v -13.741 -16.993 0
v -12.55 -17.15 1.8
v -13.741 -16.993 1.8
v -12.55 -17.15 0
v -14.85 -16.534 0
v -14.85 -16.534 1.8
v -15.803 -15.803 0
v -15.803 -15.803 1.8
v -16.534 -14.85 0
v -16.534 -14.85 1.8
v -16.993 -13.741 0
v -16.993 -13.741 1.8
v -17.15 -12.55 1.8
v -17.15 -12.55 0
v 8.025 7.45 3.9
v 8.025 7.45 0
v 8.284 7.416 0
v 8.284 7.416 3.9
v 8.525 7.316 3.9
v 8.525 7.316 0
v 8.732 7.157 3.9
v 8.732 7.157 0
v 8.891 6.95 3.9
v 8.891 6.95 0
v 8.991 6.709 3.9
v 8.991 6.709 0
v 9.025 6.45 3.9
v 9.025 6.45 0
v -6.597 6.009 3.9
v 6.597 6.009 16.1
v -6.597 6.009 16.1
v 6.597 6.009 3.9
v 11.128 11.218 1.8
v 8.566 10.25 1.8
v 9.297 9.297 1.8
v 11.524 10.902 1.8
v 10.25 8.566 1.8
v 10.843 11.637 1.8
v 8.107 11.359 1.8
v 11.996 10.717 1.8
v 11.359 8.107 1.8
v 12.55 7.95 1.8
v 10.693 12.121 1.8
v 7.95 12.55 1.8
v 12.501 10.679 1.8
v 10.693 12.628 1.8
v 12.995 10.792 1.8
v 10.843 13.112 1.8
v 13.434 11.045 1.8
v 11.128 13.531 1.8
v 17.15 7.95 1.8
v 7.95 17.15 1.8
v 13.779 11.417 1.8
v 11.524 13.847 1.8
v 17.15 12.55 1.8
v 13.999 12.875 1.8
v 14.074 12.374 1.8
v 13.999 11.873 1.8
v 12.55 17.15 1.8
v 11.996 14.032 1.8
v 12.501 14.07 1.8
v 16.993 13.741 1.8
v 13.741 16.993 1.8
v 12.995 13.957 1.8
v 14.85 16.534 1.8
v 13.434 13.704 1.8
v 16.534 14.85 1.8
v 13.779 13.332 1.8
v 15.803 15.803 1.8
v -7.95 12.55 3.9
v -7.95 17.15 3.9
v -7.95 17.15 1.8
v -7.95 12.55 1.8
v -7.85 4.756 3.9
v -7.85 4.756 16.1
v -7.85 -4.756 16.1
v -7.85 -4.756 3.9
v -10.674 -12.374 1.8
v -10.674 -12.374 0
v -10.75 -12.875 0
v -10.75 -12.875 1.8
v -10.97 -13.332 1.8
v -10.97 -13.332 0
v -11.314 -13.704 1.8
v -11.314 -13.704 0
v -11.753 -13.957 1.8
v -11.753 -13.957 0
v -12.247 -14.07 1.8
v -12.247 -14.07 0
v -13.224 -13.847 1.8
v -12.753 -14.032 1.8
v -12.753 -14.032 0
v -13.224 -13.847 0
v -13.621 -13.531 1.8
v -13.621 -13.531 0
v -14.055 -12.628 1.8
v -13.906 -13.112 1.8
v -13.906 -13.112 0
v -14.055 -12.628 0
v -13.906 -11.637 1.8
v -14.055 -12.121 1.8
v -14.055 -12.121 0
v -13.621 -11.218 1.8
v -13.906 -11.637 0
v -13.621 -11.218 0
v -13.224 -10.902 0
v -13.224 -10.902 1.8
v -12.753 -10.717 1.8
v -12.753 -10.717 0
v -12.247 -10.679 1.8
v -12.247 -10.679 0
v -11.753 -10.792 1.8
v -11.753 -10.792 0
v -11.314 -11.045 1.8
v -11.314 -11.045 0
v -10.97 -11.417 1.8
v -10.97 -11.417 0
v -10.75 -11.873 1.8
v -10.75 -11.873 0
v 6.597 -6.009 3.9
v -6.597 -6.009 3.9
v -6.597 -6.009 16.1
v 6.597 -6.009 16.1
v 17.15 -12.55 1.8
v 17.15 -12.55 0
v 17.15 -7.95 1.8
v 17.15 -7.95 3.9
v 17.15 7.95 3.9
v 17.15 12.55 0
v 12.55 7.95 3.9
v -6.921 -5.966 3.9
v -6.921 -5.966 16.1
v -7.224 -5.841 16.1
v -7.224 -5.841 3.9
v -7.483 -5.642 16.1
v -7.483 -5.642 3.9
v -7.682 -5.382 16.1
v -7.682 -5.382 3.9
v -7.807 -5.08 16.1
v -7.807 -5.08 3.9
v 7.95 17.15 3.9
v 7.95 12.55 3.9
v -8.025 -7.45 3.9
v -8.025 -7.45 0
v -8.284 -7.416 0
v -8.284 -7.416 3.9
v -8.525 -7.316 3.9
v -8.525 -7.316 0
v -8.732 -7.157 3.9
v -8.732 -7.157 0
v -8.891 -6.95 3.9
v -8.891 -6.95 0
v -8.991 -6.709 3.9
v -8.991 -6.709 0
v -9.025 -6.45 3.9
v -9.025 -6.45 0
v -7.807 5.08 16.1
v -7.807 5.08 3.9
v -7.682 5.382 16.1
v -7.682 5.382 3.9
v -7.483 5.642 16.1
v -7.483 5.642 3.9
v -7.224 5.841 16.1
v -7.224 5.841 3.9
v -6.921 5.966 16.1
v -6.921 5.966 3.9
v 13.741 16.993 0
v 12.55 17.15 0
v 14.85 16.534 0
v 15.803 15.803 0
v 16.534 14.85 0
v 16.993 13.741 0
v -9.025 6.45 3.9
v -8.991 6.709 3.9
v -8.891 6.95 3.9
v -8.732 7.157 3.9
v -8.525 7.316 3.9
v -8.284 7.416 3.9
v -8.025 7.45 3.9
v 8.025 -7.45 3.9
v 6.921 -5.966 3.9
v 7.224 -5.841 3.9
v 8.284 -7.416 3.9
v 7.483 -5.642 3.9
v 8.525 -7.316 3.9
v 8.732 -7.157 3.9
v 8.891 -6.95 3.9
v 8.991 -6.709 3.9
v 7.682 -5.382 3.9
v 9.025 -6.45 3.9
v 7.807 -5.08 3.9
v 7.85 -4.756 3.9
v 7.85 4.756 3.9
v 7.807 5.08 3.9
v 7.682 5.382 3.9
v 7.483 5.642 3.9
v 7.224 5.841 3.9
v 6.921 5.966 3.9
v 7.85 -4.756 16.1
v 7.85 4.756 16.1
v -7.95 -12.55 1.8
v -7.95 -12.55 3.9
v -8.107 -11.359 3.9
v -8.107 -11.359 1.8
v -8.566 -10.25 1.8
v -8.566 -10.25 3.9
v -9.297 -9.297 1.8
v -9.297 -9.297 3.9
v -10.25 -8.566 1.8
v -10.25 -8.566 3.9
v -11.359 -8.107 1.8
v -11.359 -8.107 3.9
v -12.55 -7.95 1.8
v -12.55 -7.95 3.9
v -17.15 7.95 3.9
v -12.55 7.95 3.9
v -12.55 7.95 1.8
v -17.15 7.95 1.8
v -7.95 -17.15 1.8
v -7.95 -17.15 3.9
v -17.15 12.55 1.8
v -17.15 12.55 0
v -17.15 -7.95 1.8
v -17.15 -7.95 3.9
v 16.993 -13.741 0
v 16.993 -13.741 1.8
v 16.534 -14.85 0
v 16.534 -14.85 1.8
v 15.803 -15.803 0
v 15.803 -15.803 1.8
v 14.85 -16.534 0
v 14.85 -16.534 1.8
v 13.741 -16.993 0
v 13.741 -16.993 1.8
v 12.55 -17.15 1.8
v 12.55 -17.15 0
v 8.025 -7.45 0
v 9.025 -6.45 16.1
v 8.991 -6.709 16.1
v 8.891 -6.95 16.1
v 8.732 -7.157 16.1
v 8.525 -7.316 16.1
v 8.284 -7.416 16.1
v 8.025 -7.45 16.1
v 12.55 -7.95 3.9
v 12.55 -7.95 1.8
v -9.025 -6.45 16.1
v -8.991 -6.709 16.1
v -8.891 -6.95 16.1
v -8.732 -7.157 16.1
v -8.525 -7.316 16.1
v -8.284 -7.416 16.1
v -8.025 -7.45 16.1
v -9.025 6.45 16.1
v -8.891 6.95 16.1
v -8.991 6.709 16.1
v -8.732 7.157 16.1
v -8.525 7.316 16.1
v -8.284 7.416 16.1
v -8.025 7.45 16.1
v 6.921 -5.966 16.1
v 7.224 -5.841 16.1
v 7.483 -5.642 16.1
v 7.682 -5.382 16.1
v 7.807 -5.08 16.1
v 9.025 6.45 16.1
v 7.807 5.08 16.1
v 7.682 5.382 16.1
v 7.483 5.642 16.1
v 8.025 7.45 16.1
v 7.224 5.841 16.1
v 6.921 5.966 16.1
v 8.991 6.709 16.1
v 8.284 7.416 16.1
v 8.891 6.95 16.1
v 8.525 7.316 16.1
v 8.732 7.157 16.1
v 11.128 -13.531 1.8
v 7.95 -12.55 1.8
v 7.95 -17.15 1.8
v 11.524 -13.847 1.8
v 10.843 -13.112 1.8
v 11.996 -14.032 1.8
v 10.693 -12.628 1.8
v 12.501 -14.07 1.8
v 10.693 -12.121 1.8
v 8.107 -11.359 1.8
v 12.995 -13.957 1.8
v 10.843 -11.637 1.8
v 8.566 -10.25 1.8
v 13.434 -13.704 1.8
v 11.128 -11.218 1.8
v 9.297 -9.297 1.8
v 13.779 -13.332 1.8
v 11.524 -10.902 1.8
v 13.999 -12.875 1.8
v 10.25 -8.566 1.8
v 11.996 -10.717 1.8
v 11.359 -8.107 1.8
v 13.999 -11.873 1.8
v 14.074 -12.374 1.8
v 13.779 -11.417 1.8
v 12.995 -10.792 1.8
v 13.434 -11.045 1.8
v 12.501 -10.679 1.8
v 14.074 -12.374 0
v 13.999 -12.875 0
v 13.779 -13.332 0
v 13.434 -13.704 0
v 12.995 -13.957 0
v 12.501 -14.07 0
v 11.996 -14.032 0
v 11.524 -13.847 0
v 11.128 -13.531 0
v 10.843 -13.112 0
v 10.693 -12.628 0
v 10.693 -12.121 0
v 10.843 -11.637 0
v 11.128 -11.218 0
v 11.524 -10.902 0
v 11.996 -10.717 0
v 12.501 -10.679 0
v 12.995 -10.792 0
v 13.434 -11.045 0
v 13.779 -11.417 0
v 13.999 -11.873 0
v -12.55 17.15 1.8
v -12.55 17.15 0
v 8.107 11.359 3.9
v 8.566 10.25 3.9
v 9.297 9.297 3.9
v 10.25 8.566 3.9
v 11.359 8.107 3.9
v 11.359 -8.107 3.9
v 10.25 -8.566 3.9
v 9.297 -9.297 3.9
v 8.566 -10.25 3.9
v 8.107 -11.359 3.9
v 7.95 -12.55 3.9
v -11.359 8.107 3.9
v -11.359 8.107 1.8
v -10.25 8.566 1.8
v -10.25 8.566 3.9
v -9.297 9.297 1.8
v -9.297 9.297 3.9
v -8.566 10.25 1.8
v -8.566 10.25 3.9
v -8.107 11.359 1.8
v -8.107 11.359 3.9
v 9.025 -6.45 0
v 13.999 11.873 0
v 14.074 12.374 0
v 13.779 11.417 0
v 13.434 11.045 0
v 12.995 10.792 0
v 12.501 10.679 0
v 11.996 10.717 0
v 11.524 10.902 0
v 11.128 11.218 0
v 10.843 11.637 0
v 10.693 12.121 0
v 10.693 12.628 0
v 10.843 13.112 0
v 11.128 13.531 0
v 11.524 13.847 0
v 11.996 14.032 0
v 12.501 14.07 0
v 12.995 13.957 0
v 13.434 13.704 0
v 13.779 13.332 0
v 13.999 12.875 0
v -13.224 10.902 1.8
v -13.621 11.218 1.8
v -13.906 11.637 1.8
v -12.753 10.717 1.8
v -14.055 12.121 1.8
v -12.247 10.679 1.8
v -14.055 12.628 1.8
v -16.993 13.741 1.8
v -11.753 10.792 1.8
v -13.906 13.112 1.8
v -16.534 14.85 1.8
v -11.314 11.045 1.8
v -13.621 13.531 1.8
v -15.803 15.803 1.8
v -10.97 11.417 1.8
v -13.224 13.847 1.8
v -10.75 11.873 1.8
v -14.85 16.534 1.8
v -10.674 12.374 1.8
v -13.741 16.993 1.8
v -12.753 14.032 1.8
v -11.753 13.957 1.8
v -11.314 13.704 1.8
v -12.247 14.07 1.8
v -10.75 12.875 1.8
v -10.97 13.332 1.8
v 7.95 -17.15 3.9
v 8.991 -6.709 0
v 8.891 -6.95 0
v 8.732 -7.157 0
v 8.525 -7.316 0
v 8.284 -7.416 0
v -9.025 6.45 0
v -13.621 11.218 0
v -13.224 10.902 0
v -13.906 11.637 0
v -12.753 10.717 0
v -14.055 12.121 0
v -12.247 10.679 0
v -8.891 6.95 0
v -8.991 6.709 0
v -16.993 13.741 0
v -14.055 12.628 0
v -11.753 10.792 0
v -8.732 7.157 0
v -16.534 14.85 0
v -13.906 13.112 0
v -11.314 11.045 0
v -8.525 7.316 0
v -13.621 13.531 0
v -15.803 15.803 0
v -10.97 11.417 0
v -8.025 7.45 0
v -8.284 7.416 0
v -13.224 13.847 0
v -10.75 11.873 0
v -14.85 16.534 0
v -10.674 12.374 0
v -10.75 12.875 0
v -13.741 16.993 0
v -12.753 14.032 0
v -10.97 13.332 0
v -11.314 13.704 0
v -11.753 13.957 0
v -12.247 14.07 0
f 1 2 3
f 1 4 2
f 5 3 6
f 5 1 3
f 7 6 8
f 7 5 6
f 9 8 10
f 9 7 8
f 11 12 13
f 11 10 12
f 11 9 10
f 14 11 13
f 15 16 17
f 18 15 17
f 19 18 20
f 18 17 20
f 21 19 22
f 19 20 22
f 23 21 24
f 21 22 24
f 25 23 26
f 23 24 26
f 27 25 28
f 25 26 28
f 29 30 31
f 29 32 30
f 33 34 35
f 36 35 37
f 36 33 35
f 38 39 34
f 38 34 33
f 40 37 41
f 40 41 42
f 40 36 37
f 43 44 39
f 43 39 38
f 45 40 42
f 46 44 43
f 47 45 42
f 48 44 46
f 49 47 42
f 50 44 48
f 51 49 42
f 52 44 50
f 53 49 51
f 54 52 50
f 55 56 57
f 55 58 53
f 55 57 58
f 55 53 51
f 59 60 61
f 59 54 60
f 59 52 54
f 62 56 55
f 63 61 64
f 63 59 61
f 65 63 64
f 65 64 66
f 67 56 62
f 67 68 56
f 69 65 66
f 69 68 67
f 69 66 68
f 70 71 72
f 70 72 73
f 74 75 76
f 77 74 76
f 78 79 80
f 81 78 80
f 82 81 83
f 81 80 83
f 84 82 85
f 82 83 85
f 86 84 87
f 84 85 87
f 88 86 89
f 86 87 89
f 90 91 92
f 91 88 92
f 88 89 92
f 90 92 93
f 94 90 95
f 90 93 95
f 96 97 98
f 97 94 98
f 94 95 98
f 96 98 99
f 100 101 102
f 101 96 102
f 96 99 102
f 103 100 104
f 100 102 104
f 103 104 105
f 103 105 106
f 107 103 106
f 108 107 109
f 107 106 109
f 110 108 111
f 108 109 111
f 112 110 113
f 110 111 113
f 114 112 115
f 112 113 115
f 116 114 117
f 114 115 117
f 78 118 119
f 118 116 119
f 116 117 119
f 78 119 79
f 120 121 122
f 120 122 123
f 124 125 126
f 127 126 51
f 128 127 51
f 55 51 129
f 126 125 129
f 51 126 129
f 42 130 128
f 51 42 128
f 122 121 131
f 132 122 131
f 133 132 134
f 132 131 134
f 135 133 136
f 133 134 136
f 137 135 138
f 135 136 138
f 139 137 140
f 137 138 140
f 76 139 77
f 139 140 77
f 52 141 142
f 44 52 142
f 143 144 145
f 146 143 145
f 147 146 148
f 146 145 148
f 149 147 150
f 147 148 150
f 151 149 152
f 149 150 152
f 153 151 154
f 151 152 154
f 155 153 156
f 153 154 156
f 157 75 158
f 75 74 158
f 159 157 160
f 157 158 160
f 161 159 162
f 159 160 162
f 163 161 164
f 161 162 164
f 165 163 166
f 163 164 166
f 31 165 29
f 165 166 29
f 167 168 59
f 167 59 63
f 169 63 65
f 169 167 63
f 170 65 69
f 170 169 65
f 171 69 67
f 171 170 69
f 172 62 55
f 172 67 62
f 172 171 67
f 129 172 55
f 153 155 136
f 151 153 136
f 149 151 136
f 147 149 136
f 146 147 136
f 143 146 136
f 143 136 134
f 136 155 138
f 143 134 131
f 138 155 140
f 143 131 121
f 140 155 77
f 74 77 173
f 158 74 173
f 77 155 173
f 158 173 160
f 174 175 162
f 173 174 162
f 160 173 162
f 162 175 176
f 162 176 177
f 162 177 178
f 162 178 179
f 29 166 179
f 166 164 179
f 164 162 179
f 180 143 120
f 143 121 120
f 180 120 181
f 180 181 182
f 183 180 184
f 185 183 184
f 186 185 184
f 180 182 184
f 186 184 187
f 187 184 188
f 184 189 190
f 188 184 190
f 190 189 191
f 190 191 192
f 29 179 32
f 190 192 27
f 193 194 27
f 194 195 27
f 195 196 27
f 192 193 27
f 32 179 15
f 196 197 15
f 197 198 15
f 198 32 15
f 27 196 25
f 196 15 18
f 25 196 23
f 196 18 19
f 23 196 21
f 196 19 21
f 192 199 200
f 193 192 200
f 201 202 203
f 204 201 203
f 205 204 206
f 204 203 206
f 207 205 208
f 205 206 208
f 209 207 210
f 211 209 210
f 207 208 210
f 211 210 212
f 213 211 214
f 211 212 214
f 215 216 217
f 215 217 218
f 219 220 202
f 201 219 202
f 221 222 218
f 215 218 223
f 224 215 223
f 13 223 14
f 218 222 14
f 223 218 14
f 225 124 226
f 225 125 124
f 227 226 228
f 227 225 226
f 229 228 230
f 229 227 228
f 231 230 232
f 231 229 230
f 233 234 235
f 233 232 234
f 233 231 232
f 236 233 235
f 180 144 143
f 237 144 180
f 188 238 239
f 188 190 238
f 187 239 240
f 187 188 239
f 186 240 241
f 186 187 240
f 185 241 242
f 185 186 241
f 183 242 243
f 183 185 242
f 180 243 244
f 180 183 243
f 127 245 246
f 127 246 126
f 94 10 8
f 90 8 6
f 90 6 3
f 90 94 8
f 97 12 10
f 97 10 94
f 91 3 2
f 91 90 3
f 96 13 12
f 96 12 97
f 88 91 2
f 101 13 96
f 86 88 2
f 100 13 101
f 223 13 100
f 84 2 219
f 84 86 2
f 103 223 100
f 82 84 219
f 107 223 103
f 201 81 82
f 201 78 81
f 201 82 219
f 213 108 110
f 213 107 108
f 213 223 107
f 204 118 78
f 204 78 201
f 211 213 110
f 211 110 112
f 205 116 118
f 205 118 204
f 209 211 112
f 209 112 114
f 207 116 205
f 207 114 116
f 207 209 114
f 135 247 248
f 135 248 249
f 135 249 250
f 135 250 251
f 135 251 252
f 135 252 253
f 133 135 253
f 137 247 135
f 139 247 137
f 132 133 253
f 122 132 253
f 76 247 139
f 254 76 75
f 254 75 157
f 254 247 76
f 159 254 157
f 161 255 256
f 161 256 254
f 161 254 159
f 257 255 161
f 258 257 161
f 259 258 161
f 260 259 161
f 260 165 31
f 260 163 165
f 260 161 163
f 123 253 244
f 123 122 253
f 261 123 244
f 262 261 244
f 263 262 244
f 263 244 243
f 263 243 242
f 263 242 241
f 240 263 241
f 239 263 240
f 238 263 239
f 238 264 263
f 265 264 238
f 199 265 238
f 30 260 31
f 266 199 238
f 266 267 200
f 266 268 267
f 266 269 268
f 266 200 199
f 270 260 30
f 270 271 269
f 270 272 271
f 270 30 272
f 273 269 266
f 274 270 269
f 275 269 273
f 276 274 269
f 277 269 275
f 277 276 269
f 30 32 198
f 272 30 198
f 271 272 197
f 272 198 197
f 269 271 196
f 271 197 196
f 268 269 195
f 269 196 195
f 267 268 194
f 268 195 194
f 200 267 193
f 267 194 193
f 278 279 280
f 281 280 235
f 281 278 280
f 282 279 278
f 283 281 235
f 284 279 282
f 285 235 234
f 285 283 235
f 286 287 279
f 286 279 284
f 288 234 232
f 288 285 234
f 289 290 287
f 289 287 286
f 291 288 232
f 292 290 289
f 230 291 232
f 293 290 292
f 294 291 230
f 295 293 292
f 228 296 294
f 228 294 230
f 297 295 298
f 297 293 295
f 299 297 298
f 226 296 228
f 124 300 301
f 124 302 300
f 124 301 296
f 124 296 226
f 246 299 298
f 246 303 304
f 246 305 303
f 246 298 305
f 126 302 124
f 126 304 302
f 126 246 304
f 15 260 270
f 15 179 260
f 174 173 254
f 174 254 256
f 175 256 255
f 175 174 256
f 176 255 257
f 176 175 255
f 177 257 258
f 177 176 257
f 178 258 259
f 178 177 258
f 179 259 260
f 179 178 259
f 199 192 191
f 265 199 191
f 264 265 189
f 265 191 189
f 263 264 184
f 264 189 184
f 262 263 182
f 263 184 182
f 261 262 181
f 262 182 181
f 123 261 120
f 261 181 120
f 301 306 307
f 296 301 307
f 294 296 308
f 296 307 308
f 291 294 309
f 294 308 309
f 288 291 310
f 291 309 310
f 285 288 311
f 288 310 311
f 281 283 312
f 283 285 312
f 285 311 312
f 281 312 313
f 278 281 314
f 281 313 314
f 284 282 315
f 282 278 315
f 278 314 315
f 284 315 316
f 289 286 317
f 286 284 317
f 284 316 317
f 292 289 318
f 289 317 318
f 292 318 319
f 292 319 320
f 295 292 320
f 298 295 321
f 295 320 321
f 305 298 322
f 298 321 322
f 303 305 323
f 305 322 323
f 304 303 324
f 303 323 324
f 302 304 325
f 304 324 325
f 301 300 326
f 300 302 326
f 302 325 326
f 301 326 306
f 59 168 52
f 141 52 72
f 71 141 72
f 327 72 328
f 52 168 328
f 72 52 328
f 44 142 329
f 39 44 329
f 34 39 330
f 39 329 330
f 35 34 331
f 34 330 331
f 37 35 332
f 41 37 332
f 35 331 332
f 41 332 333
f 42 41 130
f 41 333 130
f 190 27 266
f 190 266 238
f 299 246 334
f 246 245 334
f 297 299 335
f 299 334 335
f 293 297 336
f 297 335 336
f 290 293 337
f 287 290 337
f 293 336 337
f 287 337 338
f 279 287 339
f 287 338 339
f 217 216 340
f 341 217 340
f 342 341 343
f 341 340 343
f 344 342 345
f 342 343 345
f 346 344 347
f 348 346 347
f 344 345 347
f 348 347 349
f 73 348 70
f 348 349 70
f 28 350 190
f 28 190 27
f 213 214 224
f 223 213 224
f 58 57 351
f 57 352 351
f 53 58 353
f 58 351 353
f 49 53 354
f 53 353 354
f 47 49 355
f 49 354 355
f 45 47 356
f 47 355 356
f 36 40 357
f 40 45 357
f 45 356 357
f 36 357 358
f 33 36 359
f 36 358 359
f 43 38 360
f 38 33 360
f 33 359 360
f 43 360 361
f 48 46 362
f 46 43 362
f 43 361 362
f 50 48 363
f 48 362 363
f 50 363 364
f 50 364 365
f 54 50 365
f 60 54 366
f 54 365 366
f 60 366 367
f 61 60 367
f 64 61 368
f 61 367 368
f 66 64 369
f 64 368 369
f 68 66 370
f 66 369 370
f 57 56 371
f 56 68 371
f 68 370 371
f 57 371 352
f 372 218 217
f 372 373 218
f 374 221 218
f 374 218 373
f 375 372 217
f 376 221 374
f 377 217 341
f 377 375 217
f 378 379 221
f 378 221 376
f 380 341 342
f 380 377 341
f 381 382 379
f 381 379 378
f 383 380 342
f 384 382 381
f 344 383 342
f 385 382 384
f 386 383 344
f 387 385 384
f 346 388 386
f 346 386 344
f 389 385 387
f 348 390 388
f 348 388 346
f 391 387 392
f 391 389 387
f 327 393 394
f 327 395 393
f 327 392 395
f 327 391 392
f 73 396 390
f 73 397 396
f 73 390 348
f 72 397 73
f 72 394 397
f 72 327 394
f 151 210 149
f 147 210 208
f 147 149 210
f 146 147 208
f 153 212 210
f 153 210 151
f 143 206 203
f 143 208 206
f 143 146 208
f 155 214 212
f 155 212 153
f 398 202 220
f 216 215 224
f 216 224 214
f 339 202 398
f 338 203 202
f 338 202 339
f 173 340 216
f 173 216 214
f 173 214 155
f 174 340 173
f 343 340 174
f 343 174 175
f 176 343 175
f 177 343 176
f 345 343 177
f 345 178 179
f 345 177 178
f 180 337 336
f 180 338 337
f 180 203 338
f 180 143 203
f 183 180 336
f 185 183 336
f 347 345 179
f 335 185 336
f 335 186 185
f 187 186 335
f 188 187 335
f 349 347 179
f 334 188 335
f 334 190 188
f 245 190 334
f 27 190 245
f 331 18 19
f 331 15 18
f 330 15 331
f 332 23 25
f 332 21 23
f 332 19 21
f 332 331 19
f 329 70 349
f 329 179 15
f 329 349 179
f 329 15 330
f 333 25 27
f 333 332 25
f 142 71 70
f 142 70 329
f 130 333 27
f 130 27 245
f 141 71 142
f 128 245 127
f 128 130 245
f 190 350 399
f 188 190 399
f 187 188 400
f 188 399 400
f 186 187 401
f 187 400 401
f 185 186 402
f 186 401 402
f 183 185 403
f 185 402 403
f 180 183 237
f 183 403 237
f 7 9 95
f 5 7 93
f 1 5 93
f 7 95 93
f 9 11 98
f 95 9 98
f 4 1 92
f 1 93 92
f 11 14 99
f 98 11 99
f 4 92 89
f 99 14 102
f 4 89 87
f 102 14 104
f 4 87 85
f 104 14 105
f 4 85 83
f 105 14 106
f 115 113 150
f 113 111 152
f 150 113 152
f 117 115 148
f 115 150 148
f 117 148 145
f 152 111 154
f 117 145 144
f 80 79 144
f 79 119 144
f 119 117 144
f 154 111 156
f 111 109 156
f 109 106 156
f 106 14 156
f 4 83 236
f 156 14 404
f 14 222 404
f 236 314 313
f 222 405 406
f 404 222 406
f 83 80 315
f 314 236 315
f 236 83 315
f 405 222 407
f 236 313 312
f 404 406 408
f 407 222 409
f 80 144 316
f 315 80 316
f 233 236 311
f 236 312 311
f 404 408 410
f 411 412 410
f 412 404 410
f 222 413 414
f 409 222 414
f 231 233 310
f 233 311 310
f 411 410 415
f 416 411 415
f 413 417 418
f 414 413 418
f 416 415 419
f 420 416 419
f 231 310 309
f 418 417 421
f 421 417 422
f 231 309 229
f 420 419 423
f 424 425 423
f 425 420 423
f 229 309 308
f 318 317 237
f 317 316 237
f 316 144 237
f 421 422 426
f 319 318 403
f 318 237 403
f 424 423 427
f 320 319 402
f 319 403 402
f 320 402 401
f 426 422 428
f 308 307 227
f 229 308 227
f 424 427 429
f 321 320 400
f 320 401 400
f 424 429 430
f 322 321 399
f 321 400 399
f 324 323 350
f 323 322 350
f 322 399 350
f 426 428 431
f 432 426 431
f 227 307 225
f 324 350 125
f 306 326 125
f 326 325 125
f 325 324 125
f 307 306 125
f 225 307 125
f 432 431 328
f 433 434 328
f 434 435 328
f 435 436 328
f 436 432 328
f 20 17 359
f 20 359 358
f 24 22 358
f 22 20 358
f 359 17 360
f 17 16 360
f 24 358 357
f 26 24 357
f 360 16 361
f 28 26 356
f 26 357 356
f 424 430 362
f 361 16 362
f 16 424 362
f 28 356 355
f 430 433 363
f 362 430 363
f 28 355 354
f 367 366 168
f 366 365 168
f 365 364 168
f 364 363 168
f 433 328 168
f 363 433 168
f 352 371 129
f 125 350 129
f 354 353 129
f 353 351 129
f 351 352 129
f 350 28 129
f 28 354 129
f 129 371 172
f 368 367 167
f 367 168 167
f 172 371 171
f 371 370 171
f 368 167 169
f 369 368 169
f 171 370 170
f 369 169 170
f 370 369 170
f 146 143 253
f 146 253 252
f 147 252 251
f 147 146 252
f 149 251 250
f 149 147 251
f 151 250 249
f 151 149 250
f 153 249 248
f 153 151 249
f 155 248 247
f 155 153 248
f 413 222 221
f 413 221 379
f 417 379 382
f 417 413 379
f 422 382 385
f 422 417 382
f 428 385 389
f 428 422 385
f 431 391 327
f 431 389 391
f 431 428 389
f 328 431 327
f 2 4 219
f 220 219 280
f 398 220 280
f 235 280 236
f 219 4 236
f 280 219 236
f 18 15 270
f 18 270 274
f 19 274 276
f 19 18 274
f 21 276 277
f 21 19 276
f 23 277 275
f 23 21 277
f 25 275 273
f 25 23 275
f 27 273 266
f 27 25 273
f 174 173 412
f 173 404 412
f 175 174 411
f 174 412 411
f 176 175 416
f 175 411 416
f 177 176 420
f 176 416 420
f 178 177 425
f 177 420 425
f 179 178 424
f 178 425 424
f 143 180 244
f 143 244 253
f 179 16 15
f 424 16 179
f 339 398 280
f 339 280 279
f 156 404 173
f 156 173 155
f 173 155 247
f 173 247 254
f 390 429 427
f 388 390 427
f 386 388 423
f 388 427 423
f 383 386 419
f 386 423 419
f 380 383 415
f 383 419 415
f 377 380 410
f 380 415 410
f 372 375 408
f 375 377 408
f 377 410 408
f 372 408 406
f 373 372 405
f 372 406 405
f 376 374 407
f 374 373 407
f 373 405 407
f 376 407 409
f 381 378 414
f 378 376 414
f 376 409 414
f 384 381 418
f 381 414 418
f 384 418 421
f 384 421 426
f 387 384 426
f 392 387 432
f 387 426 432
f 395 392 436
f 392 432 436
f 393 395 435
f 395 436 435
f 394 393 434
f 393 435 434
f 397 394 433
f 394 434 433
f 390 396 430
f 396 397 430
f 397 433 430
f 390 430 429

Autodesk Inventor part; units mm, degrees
ref_plane "YZ Plane" through (0, 0, 0) normal (1, 0, 0) x (0, 1, 0)
ref_plane "XZ Plane" through (0, 0, 0) normal (0, 1, 0) x (-1, 0, 0)
ref_plane "XY Plane" through (0, 0, 0) normal (0, 0, 1) x (1, 0, 0)
sketch "Sketch1" plane through (0, 0, 0) normal (0, 0, 1) x (1, 0, 0)
  line L0 (-12.55, -17.15) -> (12.55, -17.15)
  line L1 (17.15, -12.55) -> (17.15, 12.55)
  line L2 (12.55, 17.15) -> (-12.55, 17.15)
  line L3 (-17.15, 12.55) -> (-17.15, -12.55)
  line L4 (-17.15, -17.15) -> (17.15, 17.15) construction
  line L5 (17.15, -17.15) -> (-17.15, 17.15) construction
  circle A0 centre (0, 0) radius 17.5 construction
  circle A1 centre (-12.3744, 12.3744) radius 1.7
  circle A2 centre (-12.3744, -12.3744) radius 1.7
  circle A3 centre (12.3744, -12.3744) radius 1.7
  circle A4 centre (12.3744, 12.3744) radius 1.7
  line L6 (-12.3744, 12.3744) -> (-12.3744, 17.15) construction
  line L7 (-12.3744, 12.3744) -> (-7.5987, 12.3744) construction
  arc A5 (-12.55, 17.15) -> (-17.15, 12.55) centre (-12.55, 12.55) ccw
  arc A6 (17.15, 12.55) -> (12.55, 17.15) centre (12.55, 12.55) ccw
  arc A7 (12.55, -17.15) -> (17.15, -12.55) centre (12.55, -12.55) ccw
  arc A8 (-17.15, -12.55) -> (-12.55, -17.15) centre (-12.55, -12.55) ccw
  line L8 (-8.025, -7.45) -> (8.025, -7.45)
  line L9 (9.025, -6.45) -> (9.025, 6.45)
  line L10 (8.025, 7.45) -> (-8.025, 7.45)
  line L11 (-9.025, 6.45) -> (-9.025, -6.45)
  line L12 (-9.025, -7.45) -> (9.025, 7.45) construction
  line L13 (9.025, -7.45) -> (-9.025, 7.45) construction
  arc A9 (-8.025, 7.45) -> (-9.025, 6.45) centre (-8.025, 6.45) ccw
  arc A10 (9.025, 6.45) -> (8.025, 7.45) centre (8.025, 6.45) ccw
  arc A11 (8.025, -7.45) -> (9.025, -6.45) centre (8.025, -6.45) ccw
  arc A12 (-9.025, -6.45) -> (-8.025, -7.45) centre (-8.025, -6.45) ccw
  dimension "d0" = 34.3
  dimension "d1" = 34.3
  dimension "d2" = 35
  dimension "d3" = 3.4
  dimension "d4" = 3.4
  dimension "d5" = 3.4
  dimension "d6" = 3.4
  dimension "d7" = 90
  dimension "d8" = 4.6
  dimension "d9" = 18.05
  dimension "d10" = 14.9
  dimension "d11" = 1
extrude "Extrusion1" add sketch "Sketch1" along normal blind 3.9
sketch "Sketch2" plane through (0, 0, 3.9) normal (0, 0, 1) x (1, 0, 0)
  arc A0 (9.025, 6.45) -> (8.025, 7.45) centre (8.025, 6.45) ccw projected
  line L0 (9.025, 6.45) -> (9.025, -6.45) projected
  arc A1 (8.025, -7.45) -> (9.025, -6.45) centre (8.025, -6.45) ccw projected
  line L1 (8.025, -7.45) -> (-8.025, -7.45) projected
  arc A2 (-9.025, -6.45) -> (-8.025, -7.45) centre (-8.025, -6.45) ccw projected
  line L2 (-9.025, -6.45) -> (-9.025, 6.45) projected
  arc A3 (-8.025, 7.45) -> (-9.025, 6.45) centre (-8.025, 6.45) ccw projected
  line L3 (-8.025, 7.45) -> (8.025, 7.45) projected
  circle A4 centre (12.3744, 12.3744) radius 1.7 projected
  circle A5 centre (12.3744, -12.3744) radius 1.7 projected
  circle A6 centre (-12.3744, -12.3744) radius 1.7 projected
  circle A7 centre (-12.3744, 12.3744) radius 1.7 projected
  line L4 (-17.15, 12.55) -> (-17.15, -12.55) projected
  arc A8 (-17.15, -12.55) -> (-12.55, -17.15) centre (-12.55, -12.55) ccw projected
  line L5 (-12.55, -17.15) -> (12.55, -17.15) projected
  arc A9 (12.55, -17.15) -> (17.15, -12.55) centre (12.55, -12.55) ccw projected
  line L6 (17.15, -12.55) -> (17.15, 12.55) projected
  arc A10 (17.15, 12.55) -> (12.55, 17.15) centre (12.55, 12.55) ccw projected
  line L7 (12.55, 17.15) -> (-12.55, 17.15) projected
  arc A11 (-12.55, 17.15) -> (-17.15, 12.55) centre (-12.55, 12.55) ccw projected
  line L8 (12.55, 7.95) -> (17.15, 7.95)
  line L9 (17.15, 7.95) -> (17.15, 12.55)
  line L10 (12.55, 17.15) -> (7.95, 17.15)
  line L11 (7.95, 17.15) -> (7.95, 12.55)
  line L12 (7.95, 7.95) -> (17.15, 17.15) construction
  line L13 (17.15, 7.95) -> (7.95, 17.15) construction
  arc A12 (7.95, 12.55) -> (12.55, 7.95) centre (12.55, 12.55) ccw
  arc A13 (17.15, 12.55) -> (12.55, 17.15) centre (12.55, 12.55) ccw
  line L14 (-12.55, 7.95) -> (-17.15, 7.95)
  line L15 (-17.15, 7.95) -> (-17.15, 12.55)
  line L16 (-12.55, 17.15) -> (-7.95, 17.15)
  line L17 (-7.95, 17.15) -> (-7.95, 12.55)
  line L18 (-7.95, 7.95) -> (-17.15, 17.15) construction
  line L19 (-17.15, 7.95) -> (-7.95, 17.15) construction
  line L20 (-12.55, -7.95) -> (-17.15, -7.95)
  line L21 (-17.15, -7.95) -> (-17.15, -12.55)
  line L22 (-12.55, -17.15) -> (-7.95, -17.15)
  line L23 (-7.95, -17.15) -> (-7.95, -12.55)
  line L24 (-7.95, -7.95) -> (-17.15, -17.15) construction
  line L25 (-17.15, -7.95) -> (-7.95, -17.15) construction
  line L26 (12.55, -7.95) -> (17.15, -7.95)
  line L27 (17.15, -7.95) -> (17.15, -12.55)
  line L28 (12.55, -17.15) -> (7.95, -17.15)
  line L29 (7.95, -17.15) -> (7.95, -12.55)
  line L30 (7.95, -7.95) -> (17.15, -17.15) construction
  line L31 (17.15, -7.95) -> (7.95, -17.15) construction
  arc A14 (12.55, -7.95) -> (7.95, -12.55) centre (12.55, -12.55) ccw
  arc A15 (12.55, -17.15) -> (17.15, -12.55) centre (12.55, -12.55) ccw
  arc A16 (-7.95, -12.55) -> (-12.55, -7.95) centre (-12.55, -12.55) ccw
  arc A17 (-17.15, -12.55) -> (-12.55, -17.15) centre (-12.55, -12.55) ccw
  arc A18 (-12.55, 17.15) -> (-17.15, 12.55) centre (-12.55, 12.55) ccw
  arc A19 (-12.55, 7.95) -> (-7.95, 12.55) centre (-12.55, 12.55) ccw
extrude "Extrusion2" cut sketch "Sketch2" against normal blind 2.1 contours A11 L7 L17 A19 L14 L4 | L20 A16 L23 L5 A8 L4 | L7 A10 L6 L8 A12 L11 | L29 A14 L26 L6 A9 L5
sketch "Sketch3" plane through (0, 0, 3.9) normal (0, 0, 1) x (1, 0, 0)
  line L0 (-6.597, -6.009) -> (6.597, -6.009)
  line L1 (7.85, -4.756) -> (7.85, 4.756)
  line L2 (6.597, 6.009) -> (-6.597, 6.009)
  line L3 (-7.85, 4.756) -> (-7.85, -4.756)
  line L4 (-7.85, -6.009) -> (7.85, 6.009) construction
  line L5 (7.85, -6.009) -> (-7.85, 6.009) construction
  arc A0 (-6.597, 6.009) -> (-7.85, 4.756) centre (-6.597, 4.756) ccw
  arc A1 (7.85, 4.756) -> (6.597, 6.009) centre (6.597, 4.756) ccw
  arc A2 (6.597, -6.009) -> (7.85, -4.756) centre (6.597, -4.756) ccw
  arc A3 (-7.85, -4.756) -> (-6.597, -6.009) centre (-6.597, -4.756) ccw
  line L6 (-8.025, 7.45) -> (8.025, 7.45) projected
  arc A4 (-8.025, 7.45) -> (-9.025, 6.45) centre (-8.025, 6.45) ccw projected
  line L7 (-9.025, -6.45) -> (-9.025, 6.45) projected
  arc A5 (-9.025, -6.45) -> (-8.025, -7.45) centre (-8.025, -6.45) ccw projected
  line L8 (8.025, -7.45) -> (-8.025, -7.45) projected
  arc A6 (8.025, -7.45) -> (9.025, -6.45) centre (8.025, -6.45) ccw projected
  line L9 (9.025, 6.45) -> (9.025, -6.45) projected
  arc A7 (9.025, 6.45) -> (8.025, 7.45) centre (8.025, 6.45) ccw projected
  point P0 (0, 0)
  dimension "d25" = 15.7
  dimension "d26" = 12.018
  dimension "d27" = 1.253
extrude "Extrusion3" add sketch "Sketch3" along normal blind 12.2
properties part number "RJ45Panel"
